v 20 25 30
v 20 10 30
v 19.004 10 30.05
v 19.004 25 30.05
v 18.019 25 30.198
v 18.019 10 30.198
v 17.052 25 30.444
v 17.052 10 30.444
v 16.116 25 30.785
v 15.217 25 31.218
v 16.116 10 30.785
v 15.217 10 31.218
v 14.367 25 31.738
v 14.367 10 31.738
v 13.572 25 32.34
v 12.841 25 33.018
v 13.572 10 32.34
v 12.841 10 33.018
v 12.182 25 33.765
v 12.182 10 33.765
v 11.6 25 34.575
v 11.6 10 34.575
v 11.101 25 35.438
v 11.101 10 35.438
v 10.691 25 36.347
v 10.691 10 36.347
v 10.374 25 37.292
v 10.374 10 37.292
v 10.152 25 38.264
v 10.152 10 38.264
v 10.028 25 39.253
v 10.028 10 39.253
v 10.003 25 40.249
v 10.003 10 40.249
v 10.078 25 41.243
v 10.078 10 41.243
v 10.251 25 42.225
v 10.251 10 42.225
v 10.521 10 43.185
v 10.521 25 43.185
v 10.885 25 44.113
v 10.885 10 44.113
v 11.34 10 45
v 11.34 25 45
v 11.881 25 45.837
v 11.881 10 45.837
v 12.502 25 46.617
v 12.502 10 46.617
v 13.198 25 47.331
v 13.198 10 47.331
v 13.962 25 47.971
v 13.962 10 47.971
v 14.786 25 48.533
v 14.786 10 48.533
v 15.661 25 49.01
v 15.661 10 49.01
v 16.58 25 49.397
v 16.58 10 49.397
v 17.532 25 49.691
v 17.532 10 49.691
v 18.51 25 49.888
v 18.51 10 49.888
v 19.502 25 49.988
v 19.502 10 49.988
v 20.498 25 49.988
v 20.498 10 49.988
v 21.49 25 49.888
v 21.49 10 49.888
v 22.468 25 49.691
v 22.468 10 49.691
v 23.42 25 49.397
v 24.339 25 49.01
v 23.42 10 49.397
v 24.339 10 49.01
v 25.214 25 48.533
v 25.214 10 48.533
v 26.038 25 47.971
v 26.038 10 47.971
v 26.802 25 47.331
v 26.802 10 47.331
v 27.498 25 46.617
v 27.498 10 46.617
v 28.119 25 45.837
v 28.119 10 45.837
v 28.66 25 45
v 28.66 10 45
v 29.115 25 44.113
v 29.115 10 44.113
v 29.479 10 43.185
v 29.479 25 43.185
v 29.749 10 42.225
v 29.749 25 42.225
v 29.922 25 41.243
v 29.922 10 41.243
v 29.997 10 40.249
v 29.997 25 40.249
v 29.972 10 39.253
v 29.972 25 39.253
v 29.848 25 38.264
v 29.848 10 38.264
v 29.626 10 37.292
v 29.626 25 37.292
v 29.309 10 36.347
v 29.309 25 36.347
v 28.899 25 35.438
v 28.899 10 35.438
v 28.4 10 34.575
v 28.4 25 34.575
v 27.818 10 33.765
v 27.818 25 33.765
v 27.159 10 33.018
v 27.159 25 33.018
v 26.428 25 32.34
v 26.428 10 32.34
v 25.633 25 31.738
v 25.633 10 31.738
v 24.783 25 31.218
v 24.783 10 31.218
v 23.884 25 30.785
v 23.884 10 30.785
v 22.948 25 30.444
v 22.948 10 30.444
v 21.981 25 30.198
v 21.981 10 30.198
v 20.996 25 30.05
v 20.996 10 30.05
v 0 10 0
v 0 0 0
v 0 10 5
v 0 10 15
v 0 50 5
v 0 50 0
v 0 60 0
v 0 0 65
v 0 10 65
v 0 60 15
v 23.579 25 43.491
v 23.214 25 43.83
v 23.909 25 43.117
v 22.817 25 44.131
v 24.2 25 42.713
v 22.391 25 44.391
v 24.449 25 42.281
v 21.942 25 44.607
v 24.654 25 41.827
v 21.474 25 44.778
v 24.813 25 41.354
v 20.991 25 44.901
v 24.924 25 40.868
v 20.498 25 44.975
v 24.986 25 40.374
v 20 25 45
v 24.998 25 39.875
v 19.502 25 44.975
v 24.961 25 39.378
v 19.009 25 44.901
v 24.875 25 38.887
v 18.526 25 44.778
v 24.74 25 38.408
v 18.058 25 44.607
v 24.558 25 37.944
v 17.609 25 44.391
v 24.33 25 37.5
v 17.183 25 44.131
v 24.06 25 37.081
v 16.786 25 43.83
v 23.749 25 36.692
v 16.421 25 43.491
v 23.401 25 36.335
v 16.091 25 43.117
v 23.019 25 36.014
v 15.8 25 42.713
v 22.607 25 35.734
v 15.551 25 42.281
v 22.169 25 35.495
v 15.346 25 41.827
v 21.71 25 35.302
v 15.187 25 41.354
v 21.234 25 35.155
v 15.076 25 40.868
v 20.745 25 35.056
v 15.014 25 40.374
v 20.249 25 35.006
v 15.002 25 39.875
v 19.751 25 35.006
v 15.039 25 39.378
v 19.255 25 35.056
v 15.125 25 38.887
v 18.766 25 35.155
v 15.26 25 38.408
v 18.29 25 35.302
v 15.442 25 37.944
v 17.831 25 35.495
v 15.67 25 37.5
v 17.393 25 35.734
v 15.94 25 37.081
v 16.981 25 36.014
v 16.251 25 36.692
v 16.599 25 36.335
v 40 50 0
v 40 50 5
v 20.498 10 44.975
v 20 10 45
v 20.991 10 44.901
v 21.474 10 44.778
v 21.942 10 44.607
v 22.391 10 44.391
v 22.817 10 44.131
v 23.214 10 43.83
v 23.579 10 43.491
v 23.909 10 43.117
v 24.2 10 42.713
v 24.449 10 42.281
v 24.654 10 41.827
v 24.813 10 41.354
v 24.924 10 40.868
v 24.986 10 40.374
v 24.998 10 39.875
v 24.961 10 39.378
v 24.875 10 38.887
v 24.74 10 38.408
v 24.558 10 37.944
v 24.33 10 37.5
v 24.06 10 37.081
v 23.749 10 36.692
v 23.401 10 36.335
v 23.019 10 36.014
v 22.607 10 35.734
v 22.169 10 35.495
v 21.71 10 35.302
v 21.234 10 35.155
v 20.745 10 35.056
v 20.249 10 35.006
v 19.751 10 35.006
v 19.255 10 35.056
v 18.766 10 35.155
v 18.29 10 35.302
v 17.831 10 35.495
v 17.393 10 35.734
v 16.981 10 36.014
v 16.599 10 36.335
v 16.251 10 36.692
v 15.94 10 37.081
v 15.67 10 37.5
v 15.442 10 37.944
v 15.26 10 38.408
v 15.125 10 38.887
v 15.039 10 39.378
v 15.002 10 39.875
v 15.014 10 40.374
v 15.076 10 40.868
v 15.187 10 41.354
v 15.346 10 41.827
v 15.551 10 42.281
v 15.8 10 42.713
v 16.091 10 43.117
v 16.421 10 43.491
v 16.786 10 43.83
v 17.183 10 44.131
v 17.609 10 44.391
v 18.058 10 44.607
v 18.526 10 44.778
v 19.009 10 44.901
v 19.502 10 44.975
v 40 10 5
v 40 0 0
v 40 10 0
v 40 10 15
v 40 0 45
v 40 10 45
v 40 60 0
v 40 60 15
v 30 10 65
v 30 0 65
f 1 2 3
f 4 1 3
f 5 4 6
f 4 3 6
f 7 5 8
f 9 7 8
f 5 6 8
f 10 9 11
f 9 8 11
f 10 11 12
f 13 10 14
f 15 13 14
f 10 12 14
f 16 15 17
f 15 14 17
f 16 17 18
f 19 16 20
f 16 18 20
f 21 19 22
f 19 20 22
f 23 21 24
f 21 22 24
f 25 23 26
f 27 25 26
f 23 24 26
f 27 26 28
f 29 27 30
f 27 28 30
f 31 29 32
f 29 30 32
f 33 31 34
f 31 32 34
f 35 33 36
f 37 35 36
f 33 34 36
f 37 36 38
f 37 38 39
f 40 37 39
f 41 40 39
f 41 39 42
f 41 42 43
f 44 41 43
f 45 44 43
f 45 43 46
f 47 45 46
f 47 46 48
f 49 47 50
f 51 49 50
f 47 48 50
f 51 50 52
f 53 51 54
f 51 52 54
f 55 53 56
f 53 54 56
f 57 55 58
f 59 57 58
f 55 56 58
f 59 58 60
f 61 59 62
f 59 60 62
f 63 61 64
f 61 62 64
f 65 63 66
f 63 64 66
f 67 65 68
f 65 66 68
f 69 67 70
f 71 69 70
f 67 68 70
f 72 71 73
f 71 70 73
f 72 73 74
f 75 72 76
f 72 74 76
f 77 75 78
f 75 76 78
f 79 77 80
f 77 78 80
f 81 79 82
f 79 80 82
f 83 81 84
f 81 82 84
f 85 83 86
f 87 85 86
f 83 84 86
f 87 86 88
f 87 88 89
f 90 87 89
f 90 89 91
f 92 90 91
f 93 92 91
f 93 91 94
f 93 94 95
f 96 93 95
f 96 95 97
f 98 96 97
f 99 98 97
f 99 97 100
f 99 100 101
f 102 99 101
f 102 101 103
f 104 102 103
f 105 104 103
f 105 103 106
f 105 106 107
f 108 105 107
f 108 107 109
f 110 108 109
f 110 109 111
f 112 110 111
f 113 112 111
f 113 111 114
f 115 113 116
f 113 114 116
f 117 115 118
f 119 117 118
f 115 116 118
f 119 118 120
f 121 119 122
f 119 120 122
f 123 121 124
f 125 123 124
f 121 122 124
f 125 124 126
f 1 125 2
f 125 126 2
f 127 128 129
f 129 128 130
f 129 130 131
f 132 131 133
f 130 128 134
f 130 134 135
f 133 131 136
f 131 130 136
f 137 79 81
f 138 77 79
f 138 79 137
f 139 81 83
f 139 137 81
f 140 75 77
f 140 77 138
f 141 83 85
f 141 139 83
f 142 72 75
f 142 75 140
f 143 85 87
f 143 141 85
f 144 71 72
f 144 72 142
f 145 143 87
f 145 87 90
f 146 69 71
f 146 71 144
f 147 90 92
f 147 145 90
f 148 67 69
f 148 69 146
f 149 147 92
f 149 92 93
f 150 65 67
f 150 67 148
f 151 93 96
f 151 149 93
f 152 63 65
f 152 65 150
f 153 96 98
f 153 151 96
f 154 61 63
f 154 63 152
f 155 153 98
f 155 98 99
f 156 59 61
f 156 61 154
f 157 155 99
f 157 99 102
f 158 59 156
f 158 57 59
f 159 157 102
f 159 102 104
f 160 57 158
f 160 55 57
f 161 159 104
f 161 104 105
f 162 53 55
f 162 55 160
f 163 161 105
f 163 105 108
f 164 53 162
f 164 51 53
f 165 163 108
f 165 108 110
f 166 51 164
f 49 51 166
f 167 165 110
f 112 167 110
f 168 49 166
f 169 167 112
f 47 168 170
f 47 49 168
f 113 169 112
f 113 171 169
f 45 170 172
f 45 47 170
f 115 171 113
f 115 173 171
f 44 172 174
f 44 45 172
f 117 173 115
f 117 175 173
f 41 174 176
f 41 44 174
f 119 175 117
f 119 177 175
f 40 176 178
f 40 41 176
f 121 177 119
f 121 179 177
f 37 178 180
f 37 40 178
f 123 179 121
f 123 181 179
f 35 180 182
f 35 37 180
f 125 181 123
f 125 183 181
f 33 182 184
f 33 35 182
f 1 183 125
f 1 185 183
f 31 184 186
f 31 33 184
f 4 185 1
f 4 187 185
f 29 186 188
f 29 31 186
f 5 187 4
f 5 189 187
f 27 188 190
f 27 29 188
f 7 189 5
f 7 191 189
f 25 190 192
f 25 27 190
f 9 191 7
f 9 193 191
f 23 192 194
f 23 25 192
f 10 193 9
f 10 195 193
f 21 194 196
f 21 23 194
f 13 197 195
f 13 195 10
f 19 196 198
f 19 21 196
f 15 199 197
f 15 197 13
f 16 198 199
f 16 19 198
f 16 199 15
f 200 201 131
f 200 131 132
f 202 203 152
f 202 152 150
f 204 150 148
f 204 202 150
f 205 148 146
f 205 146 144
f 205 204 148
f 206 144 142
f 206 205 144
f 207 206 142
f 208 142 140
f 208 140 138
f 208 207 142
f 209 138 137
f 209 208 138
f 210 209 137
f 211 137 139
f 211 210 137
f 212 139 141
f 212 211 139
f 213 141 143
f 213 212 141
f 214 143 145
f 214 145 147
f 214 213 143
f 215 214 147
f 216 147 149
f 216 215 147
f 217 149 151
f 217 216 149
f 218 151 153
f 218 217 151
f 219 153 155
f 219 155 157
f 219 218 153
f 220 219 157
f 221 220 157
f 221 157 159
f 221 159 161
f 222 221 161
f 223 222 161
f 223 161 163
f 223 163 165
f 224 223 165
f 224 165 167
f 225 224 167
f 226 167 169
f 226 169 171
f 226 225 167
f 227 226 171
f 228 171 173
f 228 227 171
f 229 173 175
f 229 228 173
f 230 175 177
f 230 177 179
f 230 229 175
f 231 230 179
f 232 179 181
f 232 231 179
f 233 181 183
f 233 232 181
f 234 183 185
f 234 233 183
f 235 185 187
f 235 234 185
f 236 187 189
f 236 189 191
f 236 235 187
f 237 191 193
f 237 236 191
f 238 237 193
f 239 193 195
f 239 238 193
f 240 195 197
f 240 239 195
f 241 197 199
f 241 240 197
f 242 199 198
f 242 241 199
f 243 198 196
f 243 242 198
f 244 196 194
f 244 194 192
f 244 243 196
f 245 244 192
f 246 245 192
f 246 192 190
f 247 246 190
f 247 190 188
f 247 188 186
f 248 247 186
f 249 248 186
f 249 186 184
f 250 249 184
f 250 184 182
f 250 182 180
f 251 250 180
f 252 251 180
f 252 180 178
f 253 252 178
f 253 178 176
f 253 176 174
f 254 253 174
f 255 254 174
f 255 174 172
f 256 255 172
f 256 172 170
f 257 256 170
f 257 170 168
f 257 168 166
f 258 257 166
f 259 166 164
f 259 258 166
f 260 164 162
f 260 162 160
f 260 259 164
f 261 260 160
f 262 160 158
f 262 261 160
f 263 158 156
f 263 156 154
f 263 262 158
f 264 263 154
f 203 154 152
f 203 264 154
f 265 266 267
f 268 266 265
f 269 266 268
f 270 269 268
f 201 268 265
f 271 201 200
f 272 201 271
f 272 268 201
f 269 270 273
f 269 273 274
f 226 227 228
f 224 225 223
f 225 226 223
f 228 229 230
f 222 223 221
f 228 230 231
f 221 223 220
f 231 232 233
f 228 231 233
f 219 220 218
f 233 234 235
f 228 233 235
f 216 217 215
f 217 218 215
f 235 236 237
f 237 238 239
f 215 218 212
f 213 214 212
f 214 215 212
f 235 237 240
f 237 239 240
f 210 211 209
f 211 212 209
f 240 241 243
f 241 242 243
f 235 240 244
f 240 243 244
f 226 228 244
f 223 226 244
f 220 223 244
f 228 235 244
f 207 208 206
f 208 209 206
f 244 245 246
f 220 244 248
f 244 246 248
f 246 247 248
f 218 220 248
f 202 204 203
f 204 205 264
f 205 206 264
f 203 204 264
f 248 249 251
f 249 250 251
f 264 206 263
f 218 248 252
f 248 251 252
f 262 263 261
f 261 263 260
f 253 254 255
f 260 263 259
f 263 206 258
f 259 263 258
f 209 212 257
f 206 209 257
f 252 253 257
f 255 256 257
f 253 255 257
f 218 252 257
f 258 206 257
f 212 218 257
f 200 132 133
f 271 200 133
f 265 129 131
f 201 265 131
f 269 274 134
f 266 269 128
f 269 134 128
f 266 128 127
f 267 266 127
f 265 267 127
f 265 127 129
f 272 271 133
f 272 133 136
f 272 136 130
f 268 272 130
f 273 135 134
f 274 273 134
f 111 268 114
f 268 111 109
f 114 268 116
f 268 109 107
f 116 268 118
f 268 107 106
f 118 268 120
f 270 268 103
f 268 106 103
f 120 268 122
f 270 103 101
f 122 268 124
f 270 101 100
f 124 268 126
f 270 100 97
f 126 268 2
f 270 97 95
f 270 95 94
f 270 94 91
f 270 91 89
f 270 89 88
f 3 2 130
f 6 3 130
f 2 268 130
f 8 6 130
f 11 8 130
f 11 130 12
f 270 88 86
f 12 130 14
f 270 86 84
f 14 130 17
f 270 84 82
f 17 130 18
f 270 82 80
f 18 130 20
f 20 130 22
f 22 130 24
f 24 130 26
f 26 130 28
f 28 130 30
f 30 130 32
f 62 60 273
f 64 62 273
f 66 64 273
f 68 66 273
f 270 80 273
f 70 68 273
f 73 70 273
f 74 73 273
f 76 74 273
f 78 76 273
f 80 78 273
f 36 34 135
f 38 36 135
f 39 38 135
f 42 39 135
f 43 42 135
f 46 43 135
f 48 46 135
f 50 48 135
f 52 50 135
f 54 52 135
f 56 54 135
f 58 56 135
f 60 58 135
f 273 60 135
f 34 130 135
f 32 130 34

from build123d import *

# Parameters (mm, degrees)
BOSS_EXTRUDE1_DEPTH = 40
CHAMFER2_SIZE       = 10
CHAMFER2_SIZE2      = 20
SKETCH2_R           = 10
SKETCH2_R_2         = 5
BOSS_EXTRUDE2_DEPTH = 15


with BuildPart() as part:
    # Sketch1 → Boss-Extrude1 (new body)
    with BuildSketch(Plane.YZ):
        Polygon((0, 0), (10, 0), (10, 5), (50, 5), (50, 0), (60, 0), (60, 15), (10, 15), (10, 65), (0, 65), align=None)
    extrude(amount=BOSS_EXTRUDE1_DEPTH)

    # Chamfer2
    chamfer2_edges = [part.edges().sort_by_distance(p)[0] for p in [
        (40, 5, 65),
    ]]
    chamfer2_side = [part.faces().sort_by_distance(p)[0] for p in [
        (20, 5, 65),
    ]]
    chamfer(chamfer2_edges, length=CHAMFER2_SIZE, length2=CHAMFER2_SIZE2, reference=chamfer2_side[0])

    # Sketch2 → Boss-Extrude2 (add)
    with BuildSketch(Plane(origin=(0, 10, 0), x_dir=(-1, 0, 0), z_dir=(0, 1, 0))):
        with Locations(Location((-20, 40, 0), (0, 0, 270))):
            Circle(SKETCH2_R)
        with Locations(Location((-20, 40, 0), (0, 0, 90))):
            Circle(SKETCH2_R_2, mode=Mode.SUBTRACT)
    extrude(amount=BOSS_EXTRUDE2_DEPTH)


solid = part.part
